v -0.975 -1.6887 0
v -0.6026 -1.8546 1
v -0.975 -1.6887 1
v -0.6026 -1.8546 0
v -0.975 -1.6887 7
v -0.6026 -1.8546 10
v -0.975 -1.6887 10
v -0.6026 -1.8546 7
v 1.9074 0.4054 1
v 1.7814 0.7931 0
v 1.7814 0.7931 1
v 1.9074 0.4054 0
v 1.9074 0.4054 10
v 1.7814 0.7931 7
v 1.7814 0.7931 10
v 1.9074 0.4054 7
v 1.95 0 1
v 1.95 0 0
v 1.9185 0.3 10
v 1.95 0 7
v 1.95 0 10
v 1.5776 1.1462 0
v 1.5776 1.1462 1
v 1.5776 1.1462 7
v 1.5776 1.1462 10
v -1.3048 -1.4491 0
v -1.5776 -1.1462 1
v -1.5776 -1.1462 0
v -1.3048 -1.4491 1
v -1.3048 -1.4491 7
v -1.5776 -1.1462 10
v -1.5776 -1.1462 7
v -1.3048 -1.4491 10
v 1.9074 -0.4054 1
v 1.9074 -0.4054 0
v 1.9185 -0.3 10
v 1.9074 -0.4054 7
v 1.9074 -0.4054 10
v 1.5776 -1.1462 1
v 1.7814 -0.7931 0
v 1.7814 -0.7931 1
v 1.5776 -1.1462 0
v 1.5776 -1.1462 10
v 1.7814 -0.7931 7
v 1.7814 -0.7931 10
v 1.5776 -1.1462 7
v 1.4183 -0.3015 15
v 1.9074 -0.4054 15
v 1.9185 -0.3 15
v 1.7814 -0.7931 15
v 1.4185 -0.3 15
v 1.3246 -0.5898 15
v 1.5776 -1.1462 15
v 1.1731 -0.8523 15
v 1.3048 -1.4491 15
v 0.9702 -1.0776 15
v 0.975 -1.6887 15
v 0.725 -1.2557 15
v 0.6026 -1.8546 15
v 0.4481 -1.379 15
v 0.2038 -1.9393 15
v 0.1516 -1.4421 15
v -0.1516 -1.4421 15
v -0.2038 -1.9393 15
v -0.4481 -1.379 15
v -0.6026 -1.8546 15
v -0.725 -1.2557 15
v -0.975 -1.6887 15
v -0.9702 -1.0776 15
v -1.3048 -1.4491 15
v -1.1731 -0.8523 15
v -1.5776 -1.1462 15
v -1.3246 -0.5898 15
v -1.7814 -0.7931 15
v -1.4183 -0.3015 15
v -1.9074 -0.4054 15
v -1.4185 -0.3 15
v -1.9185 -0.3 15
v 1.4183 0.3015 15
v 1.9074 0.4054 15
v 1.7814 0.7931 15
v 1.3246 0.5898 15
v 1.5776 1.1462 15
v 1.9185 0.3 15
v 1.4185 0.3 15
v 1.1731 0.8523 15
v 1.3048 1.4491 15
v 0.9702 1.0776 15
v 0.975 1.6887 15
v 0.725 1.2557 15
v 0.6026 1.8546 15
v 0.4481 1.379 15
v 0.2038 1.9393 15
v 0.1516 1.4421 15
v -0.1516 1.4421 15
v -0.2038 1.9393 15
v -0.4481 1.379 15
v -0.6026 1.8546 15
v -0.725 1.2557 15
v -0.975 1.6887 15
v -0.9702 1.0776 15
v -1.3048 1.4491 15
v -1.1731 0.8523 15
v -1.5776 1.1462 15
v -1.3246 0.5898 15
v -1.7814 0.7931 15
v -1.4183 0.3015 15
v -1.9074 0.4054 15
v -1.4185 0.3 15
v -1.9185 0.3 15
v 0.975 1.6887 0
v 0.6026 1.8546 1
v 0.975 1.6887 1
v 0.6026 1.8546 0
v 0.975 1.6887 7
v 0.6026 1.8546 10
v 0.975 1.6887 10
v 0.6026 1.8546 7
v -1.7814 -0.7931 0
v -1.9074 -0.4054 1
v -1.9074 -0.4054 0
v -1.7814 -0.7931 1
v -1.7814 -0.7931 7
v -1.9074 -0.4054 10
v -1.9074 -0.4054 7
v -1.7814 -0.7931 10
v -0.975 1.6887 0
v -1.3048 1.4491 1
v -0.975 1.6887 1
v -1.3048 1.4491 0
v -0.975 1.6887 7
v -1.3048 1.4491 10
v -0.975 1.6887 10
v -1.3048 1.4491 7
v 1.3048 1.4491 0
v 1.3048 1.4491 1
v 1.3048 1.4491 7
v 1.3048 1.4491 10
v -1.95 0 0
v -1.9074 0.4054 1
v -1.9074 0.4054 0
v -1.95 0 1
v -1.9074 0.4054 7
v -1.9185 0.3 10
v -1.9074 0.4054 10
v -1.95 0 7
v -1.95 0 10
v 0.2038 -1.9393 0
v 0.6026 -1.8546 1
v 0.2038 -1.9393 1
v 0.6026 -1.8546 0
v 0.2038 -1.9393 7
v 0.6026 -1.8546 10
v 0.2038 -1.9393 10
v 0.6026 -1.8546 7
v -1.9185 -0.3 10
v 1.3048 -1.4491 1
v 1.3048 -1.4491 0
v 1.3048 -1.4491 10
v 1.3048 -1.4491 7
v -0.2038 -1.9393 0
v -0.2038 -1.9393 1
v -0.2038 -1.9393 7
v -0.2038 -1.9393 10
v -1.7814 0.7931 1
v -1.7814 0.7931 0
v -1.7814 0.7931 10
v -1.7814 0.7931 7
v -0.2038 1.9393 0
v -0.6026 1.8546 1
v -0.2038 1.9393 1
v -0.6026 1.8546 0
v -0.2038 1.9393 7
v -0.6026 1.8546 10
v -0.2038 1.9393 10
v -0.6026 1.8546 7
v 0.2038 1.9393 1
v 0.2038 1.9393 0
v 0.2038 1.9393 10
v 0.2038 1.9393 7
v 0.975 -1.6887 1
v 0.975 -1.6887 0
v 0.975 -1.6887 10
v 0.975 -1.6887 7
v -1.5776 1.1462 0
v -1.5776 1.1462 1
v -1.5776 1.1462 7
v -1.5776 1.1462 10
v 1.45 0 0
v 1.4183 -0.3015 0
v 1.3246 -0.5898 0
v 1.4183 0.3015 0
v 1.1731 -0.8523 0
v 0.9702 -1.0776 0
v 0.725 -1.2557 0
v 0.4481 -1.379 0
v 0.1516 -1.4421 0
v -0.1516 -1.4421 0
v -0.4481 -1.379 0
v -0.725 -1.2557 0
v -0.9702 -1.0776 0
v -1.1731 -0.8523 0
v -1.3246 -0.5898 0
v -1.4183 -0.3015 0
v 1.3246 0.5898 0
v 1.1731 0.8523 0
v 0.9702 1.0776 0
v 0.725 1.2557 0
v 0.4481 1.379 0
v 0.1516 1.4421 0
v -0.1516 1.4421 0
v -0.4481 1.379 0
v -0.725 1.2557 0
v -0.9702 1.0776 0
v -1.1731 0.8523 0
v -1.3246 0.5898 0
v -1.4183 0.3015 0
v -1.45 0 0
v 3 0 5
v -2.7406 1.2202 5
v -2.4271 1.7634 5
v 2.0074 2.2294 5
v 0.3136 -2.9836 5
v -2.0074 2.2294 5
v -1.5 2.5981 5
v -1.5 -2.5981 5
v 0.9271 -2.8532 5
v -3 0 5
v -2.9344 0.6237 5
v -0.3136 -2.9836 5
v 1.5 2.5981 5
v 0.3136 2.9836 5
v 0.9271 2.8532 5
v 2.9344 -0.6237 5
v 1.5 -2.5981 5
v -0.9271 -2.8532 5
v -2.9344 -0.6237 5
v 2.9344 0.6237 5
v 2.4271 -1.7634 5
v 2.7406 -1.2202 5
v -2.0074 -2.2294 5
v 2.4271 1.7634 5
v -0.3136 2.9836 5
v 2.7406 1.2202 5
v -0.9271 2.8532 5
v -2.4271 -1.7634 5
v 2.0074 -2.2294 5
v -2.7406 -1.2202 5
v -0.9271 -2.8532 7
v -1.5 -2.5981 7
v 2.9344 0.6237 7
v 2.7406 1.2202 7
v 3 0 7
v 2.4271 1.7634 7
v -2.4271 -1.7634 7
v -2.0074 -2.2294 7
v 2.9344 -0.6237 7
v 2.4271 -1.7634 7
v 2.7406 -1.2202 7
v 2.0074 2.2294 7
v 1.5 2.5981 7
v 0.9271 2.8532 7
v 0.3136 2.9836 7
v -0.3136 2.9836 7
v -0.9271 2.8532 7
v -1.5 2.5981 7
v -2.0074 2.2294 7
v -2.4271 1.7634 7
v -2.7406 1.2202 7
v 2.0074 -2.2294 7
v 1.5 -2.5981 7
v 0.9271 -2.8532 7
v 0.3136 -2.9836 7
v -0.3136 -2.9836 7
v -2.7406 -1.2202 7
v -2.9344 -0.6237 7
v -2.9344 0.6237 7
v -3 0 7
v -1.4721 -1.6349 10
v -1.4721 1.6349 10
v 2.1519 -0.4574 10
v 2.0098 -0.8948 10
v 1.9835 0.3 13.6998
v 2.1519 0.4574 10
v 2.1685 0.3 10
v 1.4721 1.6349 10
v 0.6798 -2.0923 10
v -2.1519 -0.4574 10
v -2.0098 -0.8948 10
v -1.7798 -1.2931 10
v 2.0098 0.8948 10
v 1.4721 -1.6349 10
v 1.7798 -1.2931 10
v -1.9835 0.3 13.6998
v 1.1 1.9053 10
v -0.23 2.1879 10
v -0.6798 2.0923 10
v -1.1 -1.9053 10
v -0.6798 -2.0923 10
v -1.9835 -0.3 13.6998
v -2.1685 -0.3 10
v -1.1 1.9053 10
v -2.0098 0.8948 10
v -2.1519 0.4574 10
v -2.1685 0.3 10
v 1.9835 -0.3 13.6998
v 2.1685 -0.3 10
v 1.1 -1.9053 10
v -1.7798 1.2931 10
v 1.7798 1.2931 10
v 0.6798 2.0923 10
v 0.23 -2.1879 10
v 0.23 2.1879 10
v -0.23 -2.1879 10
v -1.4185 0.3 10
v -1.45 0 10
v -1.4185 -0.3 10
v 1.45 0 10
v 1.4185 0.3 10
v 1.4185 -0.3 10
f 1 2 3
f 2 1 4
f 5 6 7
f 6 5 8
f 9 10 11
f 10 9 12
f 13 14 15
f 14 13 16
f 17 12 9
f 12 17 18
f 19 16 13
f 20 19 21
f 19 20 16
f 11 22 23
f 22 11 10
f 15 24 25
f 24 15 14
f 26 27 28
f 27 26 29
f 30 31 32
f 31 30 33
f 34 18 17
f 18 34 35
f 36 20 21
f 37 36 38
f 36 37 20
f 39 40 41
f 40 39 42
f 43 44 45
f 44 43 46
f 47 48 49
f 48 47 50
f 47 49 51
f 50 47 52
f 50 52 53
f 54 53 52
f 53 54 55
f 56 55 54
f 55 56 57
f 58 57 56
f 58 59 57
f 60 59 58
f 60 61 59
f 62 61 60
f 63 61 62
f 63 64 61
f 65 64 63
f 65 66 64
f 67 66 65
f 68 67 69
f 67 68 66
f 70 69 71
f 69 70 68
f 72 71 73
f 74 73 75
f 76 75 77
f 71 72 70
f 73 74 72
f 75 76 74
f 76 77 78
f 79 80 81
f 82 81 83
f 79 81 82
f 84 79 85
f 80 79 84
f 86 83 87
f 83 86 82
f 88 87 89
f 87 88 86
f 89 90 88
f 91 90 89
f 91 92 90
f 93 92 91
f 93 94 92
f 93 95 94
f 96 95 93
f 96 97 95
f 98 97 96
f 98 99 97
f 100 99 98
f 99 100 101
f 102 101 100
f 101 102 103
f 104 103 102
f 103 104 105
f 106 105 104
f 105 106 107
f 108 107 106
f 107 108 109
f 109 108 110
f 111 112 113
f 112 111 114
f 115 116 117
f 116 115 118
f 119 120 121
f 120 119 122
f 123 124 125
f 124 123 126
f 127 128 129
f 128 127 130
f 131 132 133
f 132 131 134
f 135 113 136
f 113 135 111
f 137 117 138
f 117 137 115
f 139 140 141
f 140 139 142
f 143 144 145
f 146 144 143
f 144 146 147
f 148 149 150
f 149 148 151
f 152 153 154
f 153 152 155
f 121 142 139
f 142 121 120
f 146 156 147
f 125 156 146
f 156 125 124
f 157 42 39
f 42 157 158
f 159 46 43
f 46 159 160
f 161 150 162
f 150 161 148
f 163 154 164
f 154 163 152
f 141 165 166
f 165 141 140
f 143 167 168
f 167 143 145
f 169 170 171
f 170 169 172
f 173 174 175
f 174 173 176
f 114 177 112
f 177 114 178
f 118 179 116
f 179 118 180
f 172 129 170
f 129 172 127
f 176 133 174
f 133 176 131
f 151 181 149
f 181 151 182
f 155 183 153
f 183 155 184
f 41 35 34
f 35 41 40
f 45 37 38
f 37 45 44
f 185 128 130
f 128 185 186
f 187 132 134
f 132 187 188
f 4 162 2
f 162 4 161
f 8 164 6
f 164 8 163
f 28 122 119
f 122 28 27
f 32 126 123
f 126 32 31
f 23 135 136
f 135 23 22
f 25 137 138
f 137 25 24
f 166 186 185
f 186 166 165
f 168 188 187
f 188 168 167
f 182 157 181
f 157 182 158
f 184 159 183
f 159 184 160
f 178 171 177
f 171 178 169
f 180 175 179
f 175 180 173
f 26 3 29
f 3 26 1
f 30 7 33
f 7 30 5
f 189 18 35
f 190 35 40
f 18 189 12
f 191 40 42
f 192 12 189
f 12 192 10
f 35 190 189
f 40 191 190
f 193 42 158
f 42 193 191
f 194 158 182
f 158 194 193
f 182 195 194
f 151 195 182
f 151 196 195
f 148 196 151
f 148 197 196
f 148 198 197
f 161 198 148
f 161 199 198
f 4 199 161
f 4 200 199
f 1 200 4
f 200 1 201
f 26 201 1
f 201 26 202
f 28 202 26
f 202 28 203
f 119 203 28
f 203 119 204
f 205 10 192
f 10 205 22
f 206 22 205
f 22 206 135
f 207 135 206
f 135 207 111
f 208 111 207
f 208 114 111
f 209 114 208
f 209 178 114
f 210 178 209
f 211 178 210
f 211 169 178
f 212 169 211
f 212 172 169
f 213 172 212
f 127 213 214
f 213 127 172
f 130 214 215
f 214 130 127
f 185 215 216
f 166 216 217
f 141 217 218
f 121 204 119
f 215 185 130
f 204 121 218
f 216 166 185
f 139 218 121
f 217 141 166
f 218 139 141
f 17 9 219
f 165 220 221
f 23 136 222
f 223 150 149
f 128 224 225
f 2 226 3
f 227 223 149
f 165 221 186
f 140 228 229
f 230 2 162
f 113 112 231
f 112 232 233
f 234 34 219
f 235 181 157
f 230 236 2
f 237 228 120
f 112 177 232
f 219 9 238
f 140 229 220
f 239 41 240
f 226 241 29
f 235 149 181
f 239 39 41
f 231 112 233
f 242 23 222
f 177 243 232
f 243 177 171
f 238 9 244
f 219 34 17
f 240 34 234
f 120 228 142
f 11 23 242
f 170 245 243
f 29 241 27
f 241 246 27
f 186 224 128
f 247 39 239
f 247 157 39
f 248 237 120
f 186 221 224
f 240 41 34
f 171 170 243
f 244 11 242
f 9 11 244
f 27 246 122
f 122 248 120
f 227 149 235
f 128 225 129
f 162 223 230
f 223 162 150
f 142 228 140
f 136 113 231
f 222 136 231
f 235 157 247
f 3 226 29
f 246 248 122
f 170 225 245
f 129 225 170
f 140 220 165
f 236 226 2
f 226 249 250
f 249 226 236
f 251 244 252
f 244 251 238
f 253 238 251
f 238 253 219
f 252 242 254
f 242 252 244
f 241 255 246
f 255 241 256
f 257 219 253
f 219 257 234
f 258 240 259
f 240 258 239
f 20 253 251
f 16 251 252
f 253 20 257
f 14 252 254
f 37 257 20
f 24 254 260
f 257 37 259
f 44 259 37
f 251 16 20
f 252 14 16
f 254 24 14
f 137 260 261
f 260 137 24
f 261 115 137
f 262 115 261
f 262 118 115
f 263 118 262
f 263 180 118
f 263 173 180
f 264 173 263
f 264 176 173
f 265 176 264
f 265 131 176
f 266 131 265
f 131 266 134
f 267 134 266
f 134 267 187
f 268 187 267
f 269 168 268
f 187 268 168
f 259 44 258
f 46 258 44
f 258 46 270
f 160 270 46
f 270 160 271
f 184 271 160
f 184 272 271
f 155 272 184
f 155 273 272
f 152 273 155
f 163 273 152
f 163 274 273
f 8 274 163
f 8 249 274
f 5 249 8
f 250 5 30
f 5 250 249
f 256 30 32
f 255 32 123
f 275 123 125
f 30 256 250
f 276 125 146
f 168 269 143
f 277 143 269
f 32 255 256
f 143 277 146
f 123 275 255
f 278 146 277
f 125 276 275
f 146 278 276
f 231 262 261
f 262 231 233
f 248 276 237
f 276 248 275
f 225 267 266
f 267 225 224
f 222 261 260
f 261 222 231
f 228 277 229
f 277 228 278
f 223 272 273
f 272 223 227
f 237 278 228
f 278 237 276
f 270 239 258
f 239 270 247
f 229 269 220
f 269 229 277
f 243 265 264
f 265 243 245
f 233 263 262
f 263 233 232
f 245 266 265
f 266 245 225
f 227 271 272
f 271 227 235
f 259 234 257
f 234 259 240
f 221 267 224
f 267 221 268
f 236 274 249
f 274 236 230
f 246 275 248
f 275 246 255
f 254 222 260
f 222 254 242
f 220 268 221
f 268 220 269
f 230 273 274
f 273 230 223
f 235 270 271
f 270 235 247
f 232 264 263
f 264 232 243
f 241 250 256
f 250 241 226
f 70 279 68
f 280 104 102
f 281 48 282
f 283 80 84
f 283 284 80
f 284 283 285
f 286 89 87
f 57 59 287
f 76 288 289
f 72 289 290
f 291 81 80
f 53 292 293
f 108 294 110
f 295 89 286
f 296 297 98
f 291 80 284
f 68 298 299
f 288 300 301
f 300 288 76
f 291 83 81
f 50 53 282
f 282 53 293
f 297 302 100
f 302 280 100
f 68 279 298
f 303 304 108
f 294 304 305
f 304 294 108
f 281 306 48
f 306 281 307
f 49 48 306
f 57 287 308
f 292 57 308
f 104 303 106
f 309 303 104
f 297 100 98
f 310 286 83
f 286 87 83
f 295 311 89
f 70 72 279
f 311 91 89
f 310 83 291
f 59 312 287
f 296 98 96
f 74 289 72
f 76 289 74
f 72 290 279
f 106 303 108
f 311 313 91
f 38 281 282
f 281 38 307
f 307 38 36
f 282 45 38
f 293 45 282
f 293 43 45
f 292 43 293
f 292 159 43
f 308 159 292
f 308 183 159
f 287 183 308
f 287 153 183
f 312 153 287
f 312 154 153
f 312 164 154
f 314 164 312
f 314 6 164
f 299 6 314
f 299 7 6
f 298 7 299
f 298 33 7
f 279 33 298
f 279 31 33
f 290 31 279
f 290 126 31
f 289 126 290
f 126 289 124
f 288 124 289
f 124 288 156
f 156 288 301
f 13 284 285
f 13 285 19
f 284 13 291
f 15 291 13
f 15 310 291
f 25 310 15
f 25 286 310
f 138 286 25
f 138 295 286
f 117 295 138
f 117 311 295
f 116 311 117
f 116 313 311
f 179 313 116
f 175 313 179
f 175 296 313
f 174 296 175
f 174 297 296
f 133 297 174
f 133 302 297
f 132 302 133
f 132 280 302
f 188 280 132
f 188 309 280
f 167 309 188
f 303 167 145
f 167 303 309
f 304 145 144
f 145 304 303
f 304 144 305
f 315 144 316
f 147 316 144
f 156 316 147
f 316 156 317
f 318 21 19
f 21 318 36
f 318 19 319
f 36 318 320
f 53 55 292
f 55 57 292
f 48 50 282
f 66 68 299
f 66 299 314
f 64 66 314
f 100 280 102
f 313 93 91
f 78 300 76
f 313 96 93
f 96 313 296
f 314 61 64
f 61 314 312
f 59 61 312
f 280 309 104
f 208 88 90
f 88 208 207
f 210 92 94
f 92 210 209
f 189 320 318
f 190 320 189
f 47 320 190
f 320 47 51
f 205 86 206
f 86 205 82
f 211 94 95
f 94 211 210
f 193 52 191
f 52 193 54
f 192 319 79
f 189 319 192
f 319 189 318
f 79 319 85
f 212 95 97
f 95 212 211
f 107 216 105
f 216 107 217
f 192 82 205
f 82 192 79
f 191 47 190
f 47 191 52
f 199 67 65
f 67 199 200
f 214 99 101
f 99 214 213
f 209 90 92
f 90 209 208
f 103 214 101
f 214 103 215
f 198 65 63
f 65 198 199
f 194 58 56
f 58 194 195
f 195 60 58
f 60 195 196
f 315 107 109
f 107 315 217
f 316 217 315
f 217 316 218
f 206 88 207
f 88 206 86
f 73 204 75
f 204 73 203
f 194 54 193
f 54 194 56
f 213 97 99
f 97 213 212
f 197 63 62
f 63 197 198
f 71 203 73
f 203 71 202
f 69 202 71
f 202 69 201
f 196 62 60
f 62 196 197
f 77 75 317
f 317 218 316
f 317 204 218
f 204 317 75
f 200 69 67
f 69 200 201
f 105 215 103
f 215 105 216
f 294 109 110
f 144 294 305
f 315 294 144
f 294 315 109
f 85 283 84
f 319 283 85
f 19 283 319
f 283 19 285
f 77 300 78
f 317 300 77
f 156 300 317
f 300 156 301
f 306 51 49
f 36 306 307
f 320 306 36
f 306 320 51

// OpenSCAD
$fs = 0.1;
union(){
    difference(){
        union(){
            cylinder(h=15, d=3.9);
                    
            translate([0,0,1])
                cylinder(h=4, d1=3.9, d2=6);
            translate([0,0,5])
                cylinder(h=2, d=6);
            translate([0,0,10])
                cylinder(h=5,d1=4.4, d2=3.9);
        }
        cylinder(h=15, d=2.9);
        
        
        translate([-3,-0.3,10])
            cube([6,0.6,5]);
    }
    
    
        
       
    
}

    
